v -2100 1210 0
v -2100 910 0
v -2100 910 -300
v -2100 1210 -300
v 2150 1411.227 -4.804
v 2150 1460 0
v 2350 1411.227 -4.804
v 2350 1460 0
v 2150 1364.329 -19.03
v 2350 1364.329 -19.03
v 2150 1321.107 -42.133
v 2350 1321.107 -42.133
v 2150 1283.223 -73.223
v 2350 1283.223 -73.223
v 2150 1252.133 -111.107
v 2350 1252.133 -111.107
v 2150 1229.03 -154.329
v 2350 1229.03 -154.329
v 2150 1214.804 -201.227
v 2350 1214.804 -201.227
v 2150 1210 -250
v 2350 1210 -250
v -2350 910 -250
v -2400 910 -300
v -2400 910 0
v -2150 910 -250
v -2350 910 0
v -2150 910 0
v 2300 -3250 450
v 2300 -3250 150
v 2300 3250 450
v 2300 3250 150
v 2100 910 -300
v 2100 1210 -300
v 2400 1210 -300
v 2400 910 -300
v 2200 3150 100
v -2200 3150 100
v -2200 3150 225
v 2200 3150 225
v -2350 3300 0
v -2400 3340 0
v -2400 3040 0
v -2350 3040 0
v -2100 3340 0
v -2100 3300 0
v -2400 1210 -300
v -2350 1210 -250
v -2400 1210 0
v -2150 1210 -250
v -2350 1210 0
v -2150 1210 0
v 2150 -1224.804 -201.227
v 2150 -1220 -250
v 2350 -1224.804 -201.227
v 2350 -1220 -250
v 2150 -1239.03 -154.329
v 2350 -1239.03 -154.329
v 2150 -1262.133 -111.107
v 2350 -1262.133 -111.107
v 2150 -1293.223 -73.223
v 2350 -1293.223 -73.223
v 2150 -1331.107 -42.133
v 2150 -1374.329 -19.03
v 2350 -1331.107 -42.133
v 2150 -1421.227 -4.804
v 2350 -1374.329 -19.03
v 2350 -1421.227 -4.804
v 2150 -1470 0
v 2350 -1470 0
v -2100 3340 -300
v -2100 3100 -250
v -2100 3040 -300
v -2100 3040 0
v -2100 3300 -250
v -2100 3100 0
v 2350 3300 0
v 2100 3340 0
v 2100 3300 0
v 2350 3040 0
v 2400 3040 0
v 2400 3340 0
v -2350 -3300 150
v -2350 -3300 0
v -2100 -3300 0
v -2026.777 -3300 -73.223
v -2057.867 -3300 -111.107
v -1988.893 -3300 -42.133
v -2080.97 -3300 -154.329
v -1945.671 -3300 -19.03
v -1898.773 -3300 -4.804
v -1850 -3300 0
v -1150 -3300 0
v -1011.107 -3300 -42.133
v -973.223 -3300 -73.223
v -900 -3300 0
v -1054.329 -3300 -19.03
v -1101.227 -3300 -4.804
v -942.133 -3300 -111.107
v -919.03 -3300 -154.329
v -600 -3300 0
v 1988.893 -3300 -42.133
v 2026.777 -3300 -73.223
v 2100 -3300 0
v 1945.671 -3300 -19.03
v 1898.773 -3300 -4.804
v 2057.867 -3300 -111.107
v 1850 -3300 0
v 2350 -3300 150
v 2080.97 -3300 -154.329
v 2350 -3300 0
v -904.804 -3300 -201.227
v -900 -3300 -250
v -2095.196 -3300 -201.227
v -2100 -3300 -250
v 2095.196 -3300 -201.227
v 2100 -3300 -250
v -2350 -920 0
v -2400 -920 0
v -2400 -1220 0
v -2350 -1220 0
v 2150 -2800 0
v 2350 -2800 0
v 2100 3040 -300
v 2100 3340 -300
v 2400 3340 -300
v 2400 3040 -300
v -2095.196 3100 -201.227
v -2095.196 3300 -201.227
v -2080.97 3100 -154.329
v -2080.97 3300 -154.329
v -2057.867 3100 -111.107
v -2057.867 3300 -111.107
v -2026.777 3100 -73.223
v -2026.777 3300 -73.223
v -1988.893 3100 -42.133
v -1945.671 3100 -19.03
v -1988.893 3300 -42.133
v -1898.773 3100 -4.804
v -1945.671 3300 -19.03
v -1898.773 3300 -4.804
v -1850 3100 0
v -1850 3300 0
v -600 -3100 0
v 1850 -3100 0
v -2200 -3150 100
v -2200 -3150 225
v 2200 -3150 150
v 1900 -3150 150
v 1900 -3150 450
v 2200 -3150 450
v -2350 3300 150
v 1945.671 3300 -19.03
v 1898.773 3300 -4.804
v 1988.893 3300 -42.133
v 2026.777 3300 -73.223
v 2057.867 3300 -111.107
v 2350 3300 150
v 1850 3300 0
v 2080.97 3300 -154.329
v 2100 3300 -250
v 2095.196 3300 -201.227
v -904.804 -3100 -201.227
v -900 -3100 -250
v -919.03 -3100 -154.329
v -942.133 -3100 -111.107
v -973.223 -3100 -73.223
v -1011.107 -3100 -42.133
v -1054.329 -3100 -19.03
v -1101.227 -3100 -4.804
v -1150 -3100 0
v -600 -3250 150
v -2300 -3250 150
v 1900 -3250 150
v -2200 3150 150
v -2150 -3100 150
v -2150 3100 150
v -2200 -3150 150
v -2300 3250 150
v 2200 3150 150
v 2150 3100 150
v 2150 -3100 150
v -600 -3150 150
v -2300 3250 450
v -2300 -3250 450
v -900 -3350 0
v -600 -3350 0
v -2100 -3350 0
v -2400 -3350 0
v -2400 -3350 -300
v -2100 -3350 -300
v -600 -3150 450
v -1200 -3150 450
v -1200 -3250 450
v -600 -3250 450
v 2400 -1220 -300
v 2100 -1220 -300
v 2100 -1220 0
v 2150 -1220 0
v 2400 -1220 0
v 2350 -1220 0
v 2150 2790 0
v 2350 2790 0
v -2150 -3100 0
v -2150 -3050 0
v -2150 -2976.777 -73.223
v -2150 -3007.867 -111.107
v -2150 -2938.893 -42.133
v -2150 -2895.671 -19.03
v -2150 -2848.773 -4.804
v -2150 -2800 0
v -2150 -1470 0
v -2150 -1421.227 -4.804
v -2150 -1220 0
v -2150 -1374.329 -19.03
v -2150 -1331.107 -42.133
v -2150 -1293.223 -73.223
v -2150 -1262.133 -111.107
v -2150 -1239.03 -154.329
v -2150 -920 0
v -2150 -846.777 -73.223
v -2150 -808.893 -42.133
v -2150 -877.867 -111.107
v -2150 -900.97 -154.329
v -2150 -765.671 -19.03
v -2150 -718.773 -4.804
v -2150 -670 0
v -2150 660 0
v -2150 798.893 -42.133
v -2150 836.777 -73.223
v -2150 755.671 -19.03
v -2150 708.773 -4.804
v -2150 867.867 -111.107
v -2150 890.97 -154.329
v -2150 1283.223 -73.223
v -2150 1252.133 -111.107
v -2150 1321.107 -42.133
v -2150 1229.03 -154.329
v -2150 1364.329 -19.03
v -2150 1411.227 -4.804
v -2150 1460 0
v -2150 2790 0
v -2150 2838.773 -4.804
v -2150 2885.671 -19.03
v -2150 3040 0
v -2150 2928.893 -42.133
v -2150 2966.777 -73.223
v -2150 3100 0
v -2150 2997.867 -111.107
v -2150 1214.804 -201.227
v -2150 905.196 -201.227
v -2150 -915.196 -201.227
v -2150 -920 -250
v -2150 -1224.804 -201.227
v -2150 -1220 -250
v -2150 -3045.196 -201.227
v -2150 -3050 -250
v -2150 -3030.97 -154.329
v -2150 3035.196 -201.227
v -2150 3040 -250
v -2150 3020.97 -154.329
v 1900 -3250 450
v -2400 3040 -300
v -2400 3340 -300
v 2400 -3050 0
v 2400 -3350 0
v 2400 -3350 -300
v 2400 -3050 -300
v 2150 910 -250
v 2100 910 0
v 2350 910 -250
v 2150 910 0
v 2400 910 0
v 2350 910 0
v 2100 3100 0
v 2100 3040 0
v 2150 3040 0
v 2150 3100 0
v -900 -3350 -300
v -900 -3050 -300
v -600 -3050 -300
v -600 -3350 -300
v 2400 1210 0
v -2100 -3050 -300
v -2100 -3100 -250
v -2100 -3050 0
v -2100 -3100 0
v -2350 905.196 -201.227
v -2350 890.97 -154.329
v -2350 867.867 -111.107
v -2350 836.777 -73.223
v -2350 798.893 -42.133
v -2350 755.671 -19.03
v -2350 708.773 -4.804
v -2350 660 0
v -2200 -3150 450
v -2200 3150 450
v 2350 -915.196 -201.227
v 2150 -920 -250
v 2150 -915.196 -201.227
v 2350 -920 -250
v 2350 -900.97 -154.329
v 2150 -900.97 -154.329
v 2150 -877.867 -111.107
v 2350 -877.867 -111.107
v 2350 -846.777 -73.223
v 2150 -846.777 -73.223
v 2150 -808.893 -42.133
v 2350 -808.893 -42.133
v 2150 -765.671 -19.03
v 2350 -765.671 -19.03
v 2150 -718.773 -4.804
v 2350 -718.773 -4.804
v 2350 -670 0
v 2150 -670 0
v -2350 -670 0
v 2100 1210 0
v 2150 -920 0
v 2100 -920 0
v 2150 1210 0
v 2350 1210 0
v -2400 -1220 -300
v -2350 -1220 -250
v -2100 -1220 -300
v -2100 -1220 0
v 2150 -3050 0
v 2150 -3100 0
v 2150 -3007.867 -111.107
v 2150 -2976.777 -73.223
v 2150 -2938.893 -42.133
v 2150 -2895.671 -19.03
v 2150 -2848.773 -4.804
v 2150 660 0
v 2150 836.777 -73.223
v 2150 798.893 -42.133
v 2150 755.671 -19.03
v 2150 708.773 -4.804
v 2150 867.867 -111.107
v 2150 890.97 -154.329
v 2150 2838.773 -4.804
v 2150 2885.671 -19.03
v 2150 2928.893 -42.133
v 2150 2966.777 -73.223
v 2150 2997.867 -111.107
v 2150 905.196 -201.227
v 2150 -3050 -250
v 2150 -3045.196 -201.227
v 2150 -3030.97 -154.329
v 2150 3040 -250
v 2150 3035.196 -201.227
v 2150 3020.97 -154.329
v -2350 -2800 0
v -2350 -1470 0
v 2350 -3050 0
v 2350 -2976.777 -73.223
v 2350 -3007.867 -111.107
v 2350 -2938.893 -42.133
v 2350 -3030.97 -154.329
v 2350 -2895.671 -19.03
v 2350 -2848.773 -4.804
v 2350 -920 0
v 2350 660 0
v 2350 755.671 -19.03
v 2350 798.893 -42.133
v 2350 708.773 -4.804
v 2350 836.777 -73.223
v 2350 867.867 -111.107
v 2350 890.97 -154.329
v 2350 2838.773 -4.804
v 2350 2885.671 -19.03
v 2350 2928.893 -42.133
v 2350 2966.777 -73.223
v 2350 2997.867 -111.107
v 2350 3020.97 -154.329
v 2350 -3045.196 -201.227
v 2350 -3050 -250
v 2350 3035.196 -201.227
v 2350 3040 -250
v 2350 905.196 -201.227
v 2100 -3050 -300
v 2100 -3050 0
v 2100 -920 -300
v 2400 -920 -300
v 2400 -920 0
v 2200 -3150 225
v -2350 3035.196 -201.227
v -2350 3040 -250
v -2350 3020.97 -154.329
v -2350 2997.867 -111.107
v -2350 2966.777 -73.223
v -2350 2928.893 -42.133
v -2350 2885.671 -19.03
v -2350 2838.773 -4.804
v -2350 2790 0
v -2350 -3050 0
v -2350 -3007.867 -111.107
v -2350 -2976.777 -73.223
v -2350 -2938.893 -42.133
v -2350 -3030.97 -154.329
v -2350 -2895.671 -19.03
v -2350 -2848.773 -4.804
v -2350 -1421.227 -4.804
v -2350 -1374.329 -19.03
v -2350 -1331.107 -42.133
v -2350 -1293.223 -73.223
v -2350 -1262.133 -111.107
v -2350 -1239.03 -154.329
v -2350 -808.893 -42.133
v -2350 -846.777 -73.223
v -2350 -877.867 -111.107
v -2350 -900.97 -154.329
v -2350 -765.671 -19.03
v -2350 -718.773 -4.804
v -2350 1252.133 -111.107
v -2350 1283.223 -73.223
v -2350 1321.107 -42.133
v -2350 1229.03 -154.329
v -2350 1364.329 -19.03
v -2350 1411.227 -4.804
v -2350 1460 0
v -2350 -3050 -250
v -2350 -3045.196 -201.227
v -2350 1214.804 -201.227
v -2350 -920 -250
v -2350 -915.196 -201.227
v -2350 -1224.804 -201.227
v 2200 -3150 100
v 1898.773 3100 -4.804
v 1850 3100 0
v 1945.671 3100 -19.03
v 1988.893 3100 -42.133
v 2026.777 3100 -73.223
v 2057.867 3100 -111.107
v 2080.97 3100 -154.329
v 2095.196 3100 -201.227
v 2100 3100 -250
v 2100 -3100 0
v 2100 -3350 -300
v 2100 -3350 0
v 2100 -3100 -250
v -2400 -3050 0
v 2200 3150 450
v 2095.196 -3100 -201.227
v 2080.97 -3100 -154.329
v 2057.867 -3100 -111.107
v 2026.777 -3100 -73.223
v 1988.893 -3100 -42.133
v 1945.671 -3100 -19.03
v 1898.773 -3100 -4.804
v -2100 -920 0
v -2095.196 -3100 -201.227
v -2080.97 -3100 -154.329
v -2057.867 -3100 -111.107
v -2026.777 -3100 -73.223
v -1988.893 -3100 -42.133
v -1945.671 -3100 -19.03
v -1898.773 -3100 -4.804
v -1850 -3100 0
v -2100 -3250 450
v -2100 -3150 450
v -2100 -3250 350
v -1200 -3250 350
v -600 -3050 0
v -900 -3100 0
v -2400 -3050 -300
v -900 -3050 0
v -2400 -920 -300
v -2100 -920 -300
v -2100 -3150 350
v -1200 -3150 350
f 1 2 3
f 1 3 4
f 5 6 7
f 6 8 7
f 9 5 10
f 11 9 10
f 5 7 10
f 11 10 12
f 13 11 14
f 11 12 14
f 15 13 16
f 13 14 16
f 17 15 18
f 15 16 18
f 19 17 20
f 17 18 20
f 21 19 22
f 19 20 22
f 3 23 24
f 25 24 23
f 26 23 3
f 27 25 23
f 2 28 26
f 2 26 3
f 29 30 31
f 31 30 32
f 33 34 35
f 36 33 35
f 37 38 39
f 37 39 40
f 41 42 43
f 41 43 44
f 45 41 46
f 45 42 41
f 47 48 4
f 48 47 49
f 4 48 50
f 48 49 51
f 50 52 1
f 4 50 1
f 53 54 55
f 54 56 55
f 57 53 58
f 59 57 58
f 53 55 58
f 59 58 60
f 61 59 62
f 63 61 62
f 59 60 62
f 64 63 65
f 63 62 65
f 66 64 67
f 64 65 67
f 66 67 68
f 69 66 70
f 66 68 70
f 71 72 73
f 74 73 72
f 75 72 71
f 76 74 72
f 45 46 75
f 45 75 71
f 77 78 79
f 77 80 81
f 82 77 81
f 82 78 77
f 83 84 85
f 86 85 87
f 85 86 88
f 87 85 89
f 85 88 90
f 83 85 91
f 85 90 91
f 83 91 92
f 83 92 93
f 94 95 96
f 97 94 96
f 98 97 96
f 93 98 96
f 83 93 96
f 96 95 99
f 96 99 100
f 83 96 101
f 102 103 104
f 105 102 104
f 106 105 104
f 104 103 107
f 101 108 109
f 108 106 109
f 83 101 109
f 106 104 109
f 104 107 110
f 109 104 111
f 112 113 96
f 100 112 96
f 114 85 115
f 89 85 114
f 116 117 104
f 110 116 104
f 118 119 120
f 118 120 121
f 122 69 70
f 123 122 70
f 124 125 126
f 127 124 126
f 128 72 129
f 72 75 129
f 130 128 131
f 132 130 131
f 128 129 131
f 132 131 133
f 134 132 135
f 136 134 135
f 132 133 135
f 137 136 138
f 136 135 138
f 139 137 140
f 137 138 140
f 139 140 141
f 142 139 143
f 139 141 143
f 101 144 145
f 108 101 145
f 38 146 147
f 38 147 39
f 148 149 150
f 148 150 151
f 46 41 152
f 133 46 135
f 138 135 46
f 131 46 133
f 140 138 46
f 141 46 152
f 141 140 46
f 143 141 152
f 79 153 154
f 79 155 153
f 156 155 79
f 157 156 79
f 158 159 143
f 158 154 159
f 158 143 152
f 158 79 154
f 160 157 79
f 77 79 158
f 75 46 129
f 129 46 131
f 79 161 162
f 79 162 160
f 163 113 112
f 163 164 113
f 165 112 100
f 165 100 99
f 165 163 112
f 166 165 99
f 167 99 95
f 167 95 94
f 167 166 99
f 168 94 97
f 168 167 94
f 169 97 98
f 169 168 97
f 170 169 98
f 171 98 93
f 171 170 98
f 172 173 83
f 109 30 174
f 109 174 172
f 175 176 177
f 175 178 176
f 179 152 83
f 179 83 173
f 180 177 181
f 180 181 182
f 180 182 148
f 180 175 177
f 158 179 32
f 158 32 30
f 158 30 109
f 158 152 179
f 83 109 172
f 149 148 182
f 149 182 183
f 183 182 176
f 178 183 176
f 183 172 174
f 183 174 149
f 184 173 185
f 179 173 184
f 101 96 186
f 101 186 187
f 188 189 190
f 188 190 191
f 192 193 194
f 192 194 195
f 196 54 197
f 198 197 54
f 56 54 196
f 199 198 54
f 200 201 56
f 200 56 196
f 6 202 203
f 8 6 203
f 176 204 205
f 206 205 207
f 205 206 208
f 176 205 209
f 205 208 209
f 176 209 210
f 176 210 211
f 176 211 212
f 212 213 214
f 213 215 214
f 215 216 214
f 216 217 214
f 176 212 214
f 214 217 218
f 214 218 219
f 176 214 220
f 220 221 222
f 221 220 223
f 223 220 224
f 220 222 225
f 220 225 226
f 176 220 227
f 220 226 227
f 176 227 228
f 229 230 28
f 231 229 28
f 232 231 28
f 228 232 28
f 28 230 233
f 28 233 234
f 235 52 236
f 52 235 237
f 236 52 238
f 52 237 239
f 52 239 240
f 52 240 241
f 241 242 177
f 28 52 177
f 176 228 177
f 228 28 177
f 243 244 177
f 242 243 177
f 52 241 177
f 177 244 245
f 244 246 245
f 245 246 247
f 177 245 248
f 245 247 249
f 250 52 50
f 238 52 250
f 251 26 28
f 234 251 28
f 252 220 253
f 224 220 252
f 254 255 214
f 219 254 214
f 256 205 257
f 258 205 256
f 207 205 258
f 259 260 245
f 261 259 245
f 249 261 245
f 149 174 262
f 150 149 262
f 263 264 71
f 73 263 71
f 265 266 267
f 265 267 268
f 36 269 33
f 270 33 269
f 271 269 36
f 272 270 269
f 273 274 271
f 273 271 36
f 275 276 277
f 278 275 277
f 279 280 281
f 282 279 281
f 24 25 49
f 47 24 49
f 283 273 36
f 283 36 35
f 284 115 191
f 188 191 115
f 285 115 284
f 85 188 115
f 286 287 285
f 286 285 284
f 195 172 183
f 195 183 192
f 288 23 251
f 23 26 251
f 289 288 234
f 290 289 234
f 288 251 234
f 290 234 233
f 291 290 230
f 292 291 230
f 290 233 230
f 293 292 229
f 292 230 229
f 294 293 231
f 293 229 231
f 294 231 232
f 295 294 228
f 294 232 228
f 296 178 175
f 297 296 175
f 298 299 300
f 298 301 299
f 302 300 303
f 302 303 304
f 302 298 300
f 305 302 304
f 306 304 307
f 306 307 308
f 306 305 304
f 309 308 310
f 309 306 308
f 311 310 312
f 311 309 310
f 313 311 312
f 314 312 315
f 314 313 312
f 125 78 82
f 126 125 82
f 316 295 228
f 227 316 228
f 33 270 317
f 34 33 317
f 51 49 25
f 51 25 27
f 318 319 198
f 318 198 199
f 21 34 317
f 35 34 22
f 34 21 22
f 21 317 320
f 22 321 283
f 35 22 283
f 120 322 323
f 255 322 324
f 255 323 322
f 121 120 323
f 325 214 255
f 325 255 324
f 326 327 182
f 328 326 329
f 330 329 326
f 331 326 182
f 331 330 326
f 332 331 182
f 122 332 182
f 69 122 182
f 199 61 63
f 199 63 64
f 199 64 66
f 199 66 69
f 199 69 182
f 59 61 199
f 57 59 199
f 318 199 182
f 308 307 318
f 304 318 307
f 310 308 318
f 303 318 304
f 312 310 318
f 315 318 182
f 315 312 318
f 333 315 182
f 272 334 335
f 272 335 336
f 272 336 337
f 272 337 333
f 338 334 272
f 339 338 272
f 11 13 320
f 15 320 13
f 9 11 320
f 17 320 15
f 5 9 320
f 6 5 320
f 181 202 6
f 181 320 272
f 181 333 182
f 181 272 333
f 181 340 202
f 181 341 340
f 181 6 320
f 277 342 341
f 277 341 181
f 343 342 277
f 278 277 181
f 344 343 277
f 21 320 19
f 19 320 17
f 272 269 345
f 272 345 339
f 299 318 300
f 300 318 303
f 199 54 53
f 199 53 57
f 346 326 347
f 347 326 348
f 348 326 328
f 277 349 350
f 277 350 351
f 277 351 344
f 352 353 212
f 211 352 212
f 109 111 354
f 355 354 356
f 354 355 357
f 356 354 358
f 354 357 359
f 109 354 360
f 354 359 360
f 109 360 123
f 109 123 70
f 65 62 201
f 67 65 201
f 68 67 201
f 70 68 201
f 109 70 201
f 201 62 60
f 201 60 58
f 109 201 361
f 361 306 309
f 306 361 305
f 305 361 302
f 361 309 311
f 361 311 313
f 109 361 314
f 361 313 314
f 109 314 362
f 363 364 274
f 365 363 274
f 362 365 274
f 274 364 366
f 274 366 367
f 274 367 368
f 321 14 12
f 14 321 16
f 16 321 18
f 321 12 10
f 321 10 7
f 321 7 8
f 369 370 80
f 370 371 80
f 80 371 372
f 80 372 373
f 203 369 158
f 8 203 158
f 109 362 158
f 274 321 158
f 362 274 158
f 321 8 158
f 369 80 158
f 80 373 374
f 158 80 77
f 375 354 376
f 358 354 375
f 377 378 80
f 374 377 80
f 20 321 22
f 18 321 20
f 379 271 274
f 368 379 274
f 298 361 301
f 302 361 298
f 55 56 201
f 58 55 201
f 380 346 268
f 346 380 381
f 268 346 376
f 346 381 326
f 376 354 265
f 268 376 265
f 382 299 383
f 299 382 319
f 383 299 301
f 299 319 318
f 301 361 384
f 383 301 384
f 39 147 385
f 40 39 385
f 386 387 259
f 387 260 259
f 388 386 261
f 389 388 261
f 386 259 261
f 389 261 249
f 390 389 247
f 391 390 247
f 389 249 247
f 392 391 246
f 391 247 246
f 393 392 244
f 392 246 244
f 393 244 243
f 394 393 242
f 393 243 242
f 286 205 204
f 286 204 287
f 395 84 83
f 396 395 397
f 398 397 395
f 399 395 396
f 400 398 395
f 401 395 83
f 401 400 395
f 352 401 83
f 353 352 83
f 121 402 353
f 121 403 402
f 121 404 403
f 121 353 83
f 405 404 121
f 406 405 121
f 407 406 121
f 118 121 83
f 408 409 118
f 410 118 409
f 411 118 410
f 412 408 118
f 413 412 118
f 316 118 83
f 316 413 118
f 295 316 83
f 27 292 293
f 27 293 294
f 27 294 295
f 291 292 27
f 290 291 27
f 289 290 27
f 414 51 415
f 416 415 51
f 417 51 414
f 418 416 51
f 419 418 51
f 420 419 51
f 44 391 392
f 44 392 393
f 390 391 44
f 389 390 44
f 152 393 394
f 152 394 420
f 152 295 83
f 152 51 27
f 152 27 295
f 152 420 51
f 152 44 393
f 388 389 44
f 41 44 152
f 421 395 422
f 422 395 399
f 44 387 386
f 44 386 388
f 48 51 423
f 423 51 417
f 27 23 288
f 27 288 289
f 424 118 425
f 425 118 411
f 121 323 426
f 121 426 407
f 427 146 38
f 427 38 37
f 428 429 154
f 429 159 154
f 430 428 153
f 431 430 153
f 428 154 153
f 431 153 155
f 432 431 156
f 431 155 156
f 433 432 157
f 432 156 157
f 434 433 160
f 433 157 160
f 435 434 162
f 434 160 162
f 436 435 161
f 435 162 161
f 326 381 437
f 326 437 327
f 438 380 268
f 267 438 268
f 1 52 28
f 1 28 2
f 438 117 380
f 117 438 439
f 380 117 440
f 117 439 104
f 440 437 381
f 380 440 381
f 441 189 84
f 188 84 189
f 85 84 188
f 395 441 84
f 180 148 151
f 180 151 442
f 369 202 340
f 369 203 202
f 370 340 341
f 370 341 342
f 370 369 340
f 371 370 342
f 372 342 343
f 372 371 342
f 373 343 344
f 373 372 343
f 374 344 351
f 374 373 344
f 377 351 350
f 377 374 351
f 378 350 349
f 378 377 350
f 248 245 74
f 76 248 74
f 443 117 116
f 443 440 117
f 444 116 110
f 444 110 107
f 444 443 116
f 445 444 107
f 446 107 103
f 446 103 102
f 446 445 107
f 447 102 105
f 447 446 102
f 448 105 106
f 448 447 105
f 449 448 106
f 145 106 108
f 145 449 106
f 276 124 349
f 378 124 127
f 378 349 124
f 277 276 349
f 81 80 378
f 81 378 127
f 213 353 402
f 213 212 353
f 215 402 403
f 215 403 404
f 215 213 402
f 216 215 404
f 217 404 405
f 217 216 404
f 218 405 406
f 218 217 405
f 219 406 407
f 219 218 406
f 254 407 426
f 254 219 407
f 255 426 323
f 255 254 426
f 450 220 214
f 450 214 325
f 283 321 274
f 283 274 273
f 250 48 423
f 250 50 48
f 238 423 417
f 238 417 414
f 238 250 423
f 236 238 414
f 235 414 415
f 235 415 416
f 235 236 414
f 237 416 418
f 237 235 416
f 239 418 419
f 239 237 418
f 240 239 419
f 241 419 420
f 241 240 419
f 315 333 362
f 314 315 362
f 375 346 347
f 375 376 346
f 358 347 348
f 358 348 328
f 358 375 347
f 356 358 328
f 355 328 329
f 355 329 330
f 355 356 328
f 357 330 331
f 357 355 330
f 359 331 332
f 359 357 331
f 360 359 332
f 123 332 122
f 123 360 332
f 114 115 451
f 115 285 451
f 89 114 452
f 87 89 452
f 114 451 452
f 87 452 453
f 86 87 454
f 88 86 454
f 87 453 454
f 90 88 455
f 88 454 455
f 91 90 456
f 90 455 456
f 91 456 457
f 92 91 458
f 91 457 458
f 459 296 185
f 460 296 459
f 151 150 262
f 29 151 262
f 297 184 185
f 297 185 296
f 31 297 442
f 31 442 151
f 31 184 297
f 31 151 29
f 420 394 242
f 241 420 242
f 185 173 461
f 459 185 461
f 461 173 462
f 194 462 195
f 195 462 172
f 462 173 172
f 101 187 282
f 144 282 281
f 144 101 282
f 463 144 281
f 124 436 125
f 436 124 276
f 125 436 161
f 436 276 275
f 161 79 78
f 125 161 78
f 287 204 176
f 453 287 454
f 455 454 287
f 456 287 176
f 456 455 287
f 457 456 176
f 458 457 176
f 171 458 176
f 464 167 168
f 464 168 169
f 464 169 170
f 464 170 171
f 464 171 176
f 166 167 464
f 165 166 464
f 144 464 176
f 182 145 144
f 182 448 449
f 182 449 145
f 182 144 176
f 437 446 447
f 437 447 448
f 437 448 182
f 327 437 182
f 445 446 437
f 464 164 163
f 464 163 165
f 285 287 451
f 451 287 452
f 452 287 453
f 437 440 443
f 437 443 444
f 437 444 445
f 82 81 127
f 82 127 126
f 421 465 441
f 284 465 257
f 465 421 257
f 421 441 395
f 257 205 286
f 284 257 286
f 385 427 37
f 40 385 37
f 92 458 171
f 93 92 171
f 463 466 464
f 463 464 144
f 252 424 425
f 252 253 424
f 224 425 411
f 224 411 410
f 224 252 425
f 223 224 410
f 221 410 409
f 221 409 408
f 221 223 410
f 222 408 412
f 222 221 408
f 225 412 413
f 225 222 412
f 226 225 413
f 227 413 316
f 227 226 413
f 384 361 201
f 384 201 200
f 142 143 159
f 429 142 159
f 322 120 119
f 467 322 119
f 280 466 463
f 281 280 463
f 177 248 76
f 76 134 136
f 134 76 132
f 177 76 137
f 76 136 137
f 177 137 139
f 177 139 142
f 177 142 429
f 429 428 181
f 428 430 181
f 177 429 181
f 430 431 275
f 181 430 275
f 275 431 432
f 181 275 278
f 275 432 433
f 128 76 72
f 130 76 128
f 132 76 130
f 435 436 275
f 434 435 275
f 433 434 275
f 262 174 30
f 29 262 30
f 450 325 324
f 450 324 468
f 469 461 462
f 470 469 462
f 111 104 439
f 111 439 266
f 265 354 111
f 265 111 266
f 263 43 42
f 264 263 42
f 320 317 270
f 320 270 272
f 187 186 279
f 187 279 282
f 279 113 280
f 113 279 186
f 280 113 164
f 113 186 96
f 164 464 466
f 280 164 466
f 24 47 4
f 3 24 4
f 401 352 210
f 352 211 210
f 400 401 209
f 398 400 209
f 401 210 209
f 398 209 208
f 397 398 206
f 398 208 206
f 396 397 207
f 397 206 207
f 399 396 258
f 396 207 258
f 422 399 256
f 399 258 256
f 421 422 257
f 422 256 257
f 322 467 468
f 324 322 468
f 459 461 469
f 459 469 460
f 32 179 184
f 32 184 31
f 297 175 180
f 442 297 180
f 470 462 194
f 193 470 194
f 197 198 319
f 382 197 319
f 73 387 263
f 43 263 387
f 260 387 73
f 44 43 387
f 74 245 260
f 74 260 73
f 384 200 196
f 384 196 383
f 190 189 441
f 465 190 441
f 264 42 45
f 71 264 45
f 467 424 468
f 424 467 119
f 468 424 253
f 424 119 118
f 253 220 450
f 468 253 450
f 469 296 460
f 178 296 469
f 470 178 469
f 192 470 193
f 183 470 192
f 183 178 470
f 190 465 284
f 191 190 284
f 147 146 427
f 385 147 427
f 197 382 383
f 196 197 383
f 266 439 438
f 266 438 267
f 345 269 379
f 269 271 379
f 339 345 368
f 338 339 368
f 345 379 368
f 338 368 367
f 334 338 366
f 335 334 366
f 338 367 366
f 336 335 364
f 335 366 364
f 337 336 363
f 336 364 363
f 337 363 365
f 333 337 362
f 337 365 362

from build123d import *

# Parameters (mm, degrees)
F0_W      = 4700
F0_H      = 6600
F0_W_2    = 4300
F0_H_2    = 6200
F1_DEPTH  = 150
F2_W      = 4600
F2_H      = 6500
F2_W_2    = 4400
F2_H_2    = 6300
F3_DEPTH  = 300
F4_W      = 300
F4_H      = 300
F5_DEPTH  = 300
F6_W      = 2500
F6_H      = 500
F7_DEPTH  = 500
F9_W      = 4400
F9_H      = 6300
F10_DEPTH = 125
F11_R     = 250
F12_W     = 900
F12_H     = 100
F13_DEPTH = 100


with BuildPart() as f1:
    # F0 (on Top) → F1 (new body)
    with BuildSketch(Plane.XY):
        Rectangle(F0_W, F0_H)
        Rectangle(F0_W_2, F0_H_2, mode=Mode.SUBTRACT)
    extrude(amount=F1_DEPTH)

    # F2 (on face) → F3 (join)
    with BuildSketch(Plane.XY.offset(150)):
        Rectangle(F2_W, F2_H)
        Rectangle(F2_W_2, F2_H_2, mode=Mode.SUBTRACT)
    extrude(amount=F3_DEPTH)

    # F4 (on Top) → F5 (join)
    with BuildSketch(Plane.XY):
        with Locations((-2250, -3200)):
            Rectangle(F4_W, F4_H)
        with Locations((-2250, -1070)):
            Rectangle(F4_W, F4_H)
        with Locations((2250, -3200)):
            Rectangle(F4_W, F4_H)
        with Locations((2250, -1070)):
            Rectangle(F4_W, F4_H)
        with Locations((-2250, 1060)):
            Rectangle(F4_W, F4_H)
        with Locations((-2250, 3190)):
            Rectangle(F4_W, F4_H)
        with Locations((2250, 1060)):
            Rectangle(F4_W, F4_H)
        with Locations((2250, 3190)):
            Rectangle(F4_W, F4_H)
        with Locations((-750, -3200)):
            Rectangle(F4_W, F4_H)
    extrude(amount=-F5_DEPTH)

    # F6 (on face) + F1_face2 (on face) → F7 (cut)
    with BuildSketch(Plane.XZ.offset(3300)):
        with Locations((650, 400)):
            Rectangle(F6_W, F6_H)
    with BuildSketch(Plane(origin=(0, -3100, 75), x_dir=(-1, 0, 0), z_dir=(0, 1, 0))):
        Polygon((-2150, 75), (-2150, -75), (-2100, -75), (600, -75), (900, -75), (2100, -75), (2150, -75), (2150, 75), align=None)
    extrude(amount=-F7_DEPTH, dir=(0, -1, 0), mode=Mode.SUBTRACT)

    # F11
    f11_edges = [f1.edges().sort_by_distance(p)[0] for p in [
        (-2100, 3200, 0),
        (-2250, 3040, 0),
        (-2250, 1210, 0),
        (-2250, 910, 0),
        (-2250, -1220, 0),
        (-2250, -920, 0),
        (-2250, -3050, 0),
        (-900, -3200, 0),
        (-2100, -3200, 0),
        (2100, -3200, 0),
        (2250, -1220, 0),
        (2250, 910, 0),
        (2250, 3040, 0),
        (2100, 3200, 0),
        (2250, -3050, 0),
        (2250, -920, 0),
        (2250, 1210, 0),
    ]]
    fillet(f11_edges, radius=F11_R)

    # F12 (on face) → F13 (cut, through all)
    with BuildSketch(Plane.XZ.offset(3250)):
        with Locations((-1650, 400)):
            Rectangle(F12_W, F12_H)
    extrude(amount=-F13_DEPTH, mode=Mode.SUBTRACT)


with BuildPart() as f10:
    # F9 (on offset) → F10 (new body)
    with BuildSketch(Plane.XY.offset(100)):
        Rectangle(F9_W, F9_H)
    extrude(amount=F10_DEPTH)


solid = Compound([f1.part, f10.part])
